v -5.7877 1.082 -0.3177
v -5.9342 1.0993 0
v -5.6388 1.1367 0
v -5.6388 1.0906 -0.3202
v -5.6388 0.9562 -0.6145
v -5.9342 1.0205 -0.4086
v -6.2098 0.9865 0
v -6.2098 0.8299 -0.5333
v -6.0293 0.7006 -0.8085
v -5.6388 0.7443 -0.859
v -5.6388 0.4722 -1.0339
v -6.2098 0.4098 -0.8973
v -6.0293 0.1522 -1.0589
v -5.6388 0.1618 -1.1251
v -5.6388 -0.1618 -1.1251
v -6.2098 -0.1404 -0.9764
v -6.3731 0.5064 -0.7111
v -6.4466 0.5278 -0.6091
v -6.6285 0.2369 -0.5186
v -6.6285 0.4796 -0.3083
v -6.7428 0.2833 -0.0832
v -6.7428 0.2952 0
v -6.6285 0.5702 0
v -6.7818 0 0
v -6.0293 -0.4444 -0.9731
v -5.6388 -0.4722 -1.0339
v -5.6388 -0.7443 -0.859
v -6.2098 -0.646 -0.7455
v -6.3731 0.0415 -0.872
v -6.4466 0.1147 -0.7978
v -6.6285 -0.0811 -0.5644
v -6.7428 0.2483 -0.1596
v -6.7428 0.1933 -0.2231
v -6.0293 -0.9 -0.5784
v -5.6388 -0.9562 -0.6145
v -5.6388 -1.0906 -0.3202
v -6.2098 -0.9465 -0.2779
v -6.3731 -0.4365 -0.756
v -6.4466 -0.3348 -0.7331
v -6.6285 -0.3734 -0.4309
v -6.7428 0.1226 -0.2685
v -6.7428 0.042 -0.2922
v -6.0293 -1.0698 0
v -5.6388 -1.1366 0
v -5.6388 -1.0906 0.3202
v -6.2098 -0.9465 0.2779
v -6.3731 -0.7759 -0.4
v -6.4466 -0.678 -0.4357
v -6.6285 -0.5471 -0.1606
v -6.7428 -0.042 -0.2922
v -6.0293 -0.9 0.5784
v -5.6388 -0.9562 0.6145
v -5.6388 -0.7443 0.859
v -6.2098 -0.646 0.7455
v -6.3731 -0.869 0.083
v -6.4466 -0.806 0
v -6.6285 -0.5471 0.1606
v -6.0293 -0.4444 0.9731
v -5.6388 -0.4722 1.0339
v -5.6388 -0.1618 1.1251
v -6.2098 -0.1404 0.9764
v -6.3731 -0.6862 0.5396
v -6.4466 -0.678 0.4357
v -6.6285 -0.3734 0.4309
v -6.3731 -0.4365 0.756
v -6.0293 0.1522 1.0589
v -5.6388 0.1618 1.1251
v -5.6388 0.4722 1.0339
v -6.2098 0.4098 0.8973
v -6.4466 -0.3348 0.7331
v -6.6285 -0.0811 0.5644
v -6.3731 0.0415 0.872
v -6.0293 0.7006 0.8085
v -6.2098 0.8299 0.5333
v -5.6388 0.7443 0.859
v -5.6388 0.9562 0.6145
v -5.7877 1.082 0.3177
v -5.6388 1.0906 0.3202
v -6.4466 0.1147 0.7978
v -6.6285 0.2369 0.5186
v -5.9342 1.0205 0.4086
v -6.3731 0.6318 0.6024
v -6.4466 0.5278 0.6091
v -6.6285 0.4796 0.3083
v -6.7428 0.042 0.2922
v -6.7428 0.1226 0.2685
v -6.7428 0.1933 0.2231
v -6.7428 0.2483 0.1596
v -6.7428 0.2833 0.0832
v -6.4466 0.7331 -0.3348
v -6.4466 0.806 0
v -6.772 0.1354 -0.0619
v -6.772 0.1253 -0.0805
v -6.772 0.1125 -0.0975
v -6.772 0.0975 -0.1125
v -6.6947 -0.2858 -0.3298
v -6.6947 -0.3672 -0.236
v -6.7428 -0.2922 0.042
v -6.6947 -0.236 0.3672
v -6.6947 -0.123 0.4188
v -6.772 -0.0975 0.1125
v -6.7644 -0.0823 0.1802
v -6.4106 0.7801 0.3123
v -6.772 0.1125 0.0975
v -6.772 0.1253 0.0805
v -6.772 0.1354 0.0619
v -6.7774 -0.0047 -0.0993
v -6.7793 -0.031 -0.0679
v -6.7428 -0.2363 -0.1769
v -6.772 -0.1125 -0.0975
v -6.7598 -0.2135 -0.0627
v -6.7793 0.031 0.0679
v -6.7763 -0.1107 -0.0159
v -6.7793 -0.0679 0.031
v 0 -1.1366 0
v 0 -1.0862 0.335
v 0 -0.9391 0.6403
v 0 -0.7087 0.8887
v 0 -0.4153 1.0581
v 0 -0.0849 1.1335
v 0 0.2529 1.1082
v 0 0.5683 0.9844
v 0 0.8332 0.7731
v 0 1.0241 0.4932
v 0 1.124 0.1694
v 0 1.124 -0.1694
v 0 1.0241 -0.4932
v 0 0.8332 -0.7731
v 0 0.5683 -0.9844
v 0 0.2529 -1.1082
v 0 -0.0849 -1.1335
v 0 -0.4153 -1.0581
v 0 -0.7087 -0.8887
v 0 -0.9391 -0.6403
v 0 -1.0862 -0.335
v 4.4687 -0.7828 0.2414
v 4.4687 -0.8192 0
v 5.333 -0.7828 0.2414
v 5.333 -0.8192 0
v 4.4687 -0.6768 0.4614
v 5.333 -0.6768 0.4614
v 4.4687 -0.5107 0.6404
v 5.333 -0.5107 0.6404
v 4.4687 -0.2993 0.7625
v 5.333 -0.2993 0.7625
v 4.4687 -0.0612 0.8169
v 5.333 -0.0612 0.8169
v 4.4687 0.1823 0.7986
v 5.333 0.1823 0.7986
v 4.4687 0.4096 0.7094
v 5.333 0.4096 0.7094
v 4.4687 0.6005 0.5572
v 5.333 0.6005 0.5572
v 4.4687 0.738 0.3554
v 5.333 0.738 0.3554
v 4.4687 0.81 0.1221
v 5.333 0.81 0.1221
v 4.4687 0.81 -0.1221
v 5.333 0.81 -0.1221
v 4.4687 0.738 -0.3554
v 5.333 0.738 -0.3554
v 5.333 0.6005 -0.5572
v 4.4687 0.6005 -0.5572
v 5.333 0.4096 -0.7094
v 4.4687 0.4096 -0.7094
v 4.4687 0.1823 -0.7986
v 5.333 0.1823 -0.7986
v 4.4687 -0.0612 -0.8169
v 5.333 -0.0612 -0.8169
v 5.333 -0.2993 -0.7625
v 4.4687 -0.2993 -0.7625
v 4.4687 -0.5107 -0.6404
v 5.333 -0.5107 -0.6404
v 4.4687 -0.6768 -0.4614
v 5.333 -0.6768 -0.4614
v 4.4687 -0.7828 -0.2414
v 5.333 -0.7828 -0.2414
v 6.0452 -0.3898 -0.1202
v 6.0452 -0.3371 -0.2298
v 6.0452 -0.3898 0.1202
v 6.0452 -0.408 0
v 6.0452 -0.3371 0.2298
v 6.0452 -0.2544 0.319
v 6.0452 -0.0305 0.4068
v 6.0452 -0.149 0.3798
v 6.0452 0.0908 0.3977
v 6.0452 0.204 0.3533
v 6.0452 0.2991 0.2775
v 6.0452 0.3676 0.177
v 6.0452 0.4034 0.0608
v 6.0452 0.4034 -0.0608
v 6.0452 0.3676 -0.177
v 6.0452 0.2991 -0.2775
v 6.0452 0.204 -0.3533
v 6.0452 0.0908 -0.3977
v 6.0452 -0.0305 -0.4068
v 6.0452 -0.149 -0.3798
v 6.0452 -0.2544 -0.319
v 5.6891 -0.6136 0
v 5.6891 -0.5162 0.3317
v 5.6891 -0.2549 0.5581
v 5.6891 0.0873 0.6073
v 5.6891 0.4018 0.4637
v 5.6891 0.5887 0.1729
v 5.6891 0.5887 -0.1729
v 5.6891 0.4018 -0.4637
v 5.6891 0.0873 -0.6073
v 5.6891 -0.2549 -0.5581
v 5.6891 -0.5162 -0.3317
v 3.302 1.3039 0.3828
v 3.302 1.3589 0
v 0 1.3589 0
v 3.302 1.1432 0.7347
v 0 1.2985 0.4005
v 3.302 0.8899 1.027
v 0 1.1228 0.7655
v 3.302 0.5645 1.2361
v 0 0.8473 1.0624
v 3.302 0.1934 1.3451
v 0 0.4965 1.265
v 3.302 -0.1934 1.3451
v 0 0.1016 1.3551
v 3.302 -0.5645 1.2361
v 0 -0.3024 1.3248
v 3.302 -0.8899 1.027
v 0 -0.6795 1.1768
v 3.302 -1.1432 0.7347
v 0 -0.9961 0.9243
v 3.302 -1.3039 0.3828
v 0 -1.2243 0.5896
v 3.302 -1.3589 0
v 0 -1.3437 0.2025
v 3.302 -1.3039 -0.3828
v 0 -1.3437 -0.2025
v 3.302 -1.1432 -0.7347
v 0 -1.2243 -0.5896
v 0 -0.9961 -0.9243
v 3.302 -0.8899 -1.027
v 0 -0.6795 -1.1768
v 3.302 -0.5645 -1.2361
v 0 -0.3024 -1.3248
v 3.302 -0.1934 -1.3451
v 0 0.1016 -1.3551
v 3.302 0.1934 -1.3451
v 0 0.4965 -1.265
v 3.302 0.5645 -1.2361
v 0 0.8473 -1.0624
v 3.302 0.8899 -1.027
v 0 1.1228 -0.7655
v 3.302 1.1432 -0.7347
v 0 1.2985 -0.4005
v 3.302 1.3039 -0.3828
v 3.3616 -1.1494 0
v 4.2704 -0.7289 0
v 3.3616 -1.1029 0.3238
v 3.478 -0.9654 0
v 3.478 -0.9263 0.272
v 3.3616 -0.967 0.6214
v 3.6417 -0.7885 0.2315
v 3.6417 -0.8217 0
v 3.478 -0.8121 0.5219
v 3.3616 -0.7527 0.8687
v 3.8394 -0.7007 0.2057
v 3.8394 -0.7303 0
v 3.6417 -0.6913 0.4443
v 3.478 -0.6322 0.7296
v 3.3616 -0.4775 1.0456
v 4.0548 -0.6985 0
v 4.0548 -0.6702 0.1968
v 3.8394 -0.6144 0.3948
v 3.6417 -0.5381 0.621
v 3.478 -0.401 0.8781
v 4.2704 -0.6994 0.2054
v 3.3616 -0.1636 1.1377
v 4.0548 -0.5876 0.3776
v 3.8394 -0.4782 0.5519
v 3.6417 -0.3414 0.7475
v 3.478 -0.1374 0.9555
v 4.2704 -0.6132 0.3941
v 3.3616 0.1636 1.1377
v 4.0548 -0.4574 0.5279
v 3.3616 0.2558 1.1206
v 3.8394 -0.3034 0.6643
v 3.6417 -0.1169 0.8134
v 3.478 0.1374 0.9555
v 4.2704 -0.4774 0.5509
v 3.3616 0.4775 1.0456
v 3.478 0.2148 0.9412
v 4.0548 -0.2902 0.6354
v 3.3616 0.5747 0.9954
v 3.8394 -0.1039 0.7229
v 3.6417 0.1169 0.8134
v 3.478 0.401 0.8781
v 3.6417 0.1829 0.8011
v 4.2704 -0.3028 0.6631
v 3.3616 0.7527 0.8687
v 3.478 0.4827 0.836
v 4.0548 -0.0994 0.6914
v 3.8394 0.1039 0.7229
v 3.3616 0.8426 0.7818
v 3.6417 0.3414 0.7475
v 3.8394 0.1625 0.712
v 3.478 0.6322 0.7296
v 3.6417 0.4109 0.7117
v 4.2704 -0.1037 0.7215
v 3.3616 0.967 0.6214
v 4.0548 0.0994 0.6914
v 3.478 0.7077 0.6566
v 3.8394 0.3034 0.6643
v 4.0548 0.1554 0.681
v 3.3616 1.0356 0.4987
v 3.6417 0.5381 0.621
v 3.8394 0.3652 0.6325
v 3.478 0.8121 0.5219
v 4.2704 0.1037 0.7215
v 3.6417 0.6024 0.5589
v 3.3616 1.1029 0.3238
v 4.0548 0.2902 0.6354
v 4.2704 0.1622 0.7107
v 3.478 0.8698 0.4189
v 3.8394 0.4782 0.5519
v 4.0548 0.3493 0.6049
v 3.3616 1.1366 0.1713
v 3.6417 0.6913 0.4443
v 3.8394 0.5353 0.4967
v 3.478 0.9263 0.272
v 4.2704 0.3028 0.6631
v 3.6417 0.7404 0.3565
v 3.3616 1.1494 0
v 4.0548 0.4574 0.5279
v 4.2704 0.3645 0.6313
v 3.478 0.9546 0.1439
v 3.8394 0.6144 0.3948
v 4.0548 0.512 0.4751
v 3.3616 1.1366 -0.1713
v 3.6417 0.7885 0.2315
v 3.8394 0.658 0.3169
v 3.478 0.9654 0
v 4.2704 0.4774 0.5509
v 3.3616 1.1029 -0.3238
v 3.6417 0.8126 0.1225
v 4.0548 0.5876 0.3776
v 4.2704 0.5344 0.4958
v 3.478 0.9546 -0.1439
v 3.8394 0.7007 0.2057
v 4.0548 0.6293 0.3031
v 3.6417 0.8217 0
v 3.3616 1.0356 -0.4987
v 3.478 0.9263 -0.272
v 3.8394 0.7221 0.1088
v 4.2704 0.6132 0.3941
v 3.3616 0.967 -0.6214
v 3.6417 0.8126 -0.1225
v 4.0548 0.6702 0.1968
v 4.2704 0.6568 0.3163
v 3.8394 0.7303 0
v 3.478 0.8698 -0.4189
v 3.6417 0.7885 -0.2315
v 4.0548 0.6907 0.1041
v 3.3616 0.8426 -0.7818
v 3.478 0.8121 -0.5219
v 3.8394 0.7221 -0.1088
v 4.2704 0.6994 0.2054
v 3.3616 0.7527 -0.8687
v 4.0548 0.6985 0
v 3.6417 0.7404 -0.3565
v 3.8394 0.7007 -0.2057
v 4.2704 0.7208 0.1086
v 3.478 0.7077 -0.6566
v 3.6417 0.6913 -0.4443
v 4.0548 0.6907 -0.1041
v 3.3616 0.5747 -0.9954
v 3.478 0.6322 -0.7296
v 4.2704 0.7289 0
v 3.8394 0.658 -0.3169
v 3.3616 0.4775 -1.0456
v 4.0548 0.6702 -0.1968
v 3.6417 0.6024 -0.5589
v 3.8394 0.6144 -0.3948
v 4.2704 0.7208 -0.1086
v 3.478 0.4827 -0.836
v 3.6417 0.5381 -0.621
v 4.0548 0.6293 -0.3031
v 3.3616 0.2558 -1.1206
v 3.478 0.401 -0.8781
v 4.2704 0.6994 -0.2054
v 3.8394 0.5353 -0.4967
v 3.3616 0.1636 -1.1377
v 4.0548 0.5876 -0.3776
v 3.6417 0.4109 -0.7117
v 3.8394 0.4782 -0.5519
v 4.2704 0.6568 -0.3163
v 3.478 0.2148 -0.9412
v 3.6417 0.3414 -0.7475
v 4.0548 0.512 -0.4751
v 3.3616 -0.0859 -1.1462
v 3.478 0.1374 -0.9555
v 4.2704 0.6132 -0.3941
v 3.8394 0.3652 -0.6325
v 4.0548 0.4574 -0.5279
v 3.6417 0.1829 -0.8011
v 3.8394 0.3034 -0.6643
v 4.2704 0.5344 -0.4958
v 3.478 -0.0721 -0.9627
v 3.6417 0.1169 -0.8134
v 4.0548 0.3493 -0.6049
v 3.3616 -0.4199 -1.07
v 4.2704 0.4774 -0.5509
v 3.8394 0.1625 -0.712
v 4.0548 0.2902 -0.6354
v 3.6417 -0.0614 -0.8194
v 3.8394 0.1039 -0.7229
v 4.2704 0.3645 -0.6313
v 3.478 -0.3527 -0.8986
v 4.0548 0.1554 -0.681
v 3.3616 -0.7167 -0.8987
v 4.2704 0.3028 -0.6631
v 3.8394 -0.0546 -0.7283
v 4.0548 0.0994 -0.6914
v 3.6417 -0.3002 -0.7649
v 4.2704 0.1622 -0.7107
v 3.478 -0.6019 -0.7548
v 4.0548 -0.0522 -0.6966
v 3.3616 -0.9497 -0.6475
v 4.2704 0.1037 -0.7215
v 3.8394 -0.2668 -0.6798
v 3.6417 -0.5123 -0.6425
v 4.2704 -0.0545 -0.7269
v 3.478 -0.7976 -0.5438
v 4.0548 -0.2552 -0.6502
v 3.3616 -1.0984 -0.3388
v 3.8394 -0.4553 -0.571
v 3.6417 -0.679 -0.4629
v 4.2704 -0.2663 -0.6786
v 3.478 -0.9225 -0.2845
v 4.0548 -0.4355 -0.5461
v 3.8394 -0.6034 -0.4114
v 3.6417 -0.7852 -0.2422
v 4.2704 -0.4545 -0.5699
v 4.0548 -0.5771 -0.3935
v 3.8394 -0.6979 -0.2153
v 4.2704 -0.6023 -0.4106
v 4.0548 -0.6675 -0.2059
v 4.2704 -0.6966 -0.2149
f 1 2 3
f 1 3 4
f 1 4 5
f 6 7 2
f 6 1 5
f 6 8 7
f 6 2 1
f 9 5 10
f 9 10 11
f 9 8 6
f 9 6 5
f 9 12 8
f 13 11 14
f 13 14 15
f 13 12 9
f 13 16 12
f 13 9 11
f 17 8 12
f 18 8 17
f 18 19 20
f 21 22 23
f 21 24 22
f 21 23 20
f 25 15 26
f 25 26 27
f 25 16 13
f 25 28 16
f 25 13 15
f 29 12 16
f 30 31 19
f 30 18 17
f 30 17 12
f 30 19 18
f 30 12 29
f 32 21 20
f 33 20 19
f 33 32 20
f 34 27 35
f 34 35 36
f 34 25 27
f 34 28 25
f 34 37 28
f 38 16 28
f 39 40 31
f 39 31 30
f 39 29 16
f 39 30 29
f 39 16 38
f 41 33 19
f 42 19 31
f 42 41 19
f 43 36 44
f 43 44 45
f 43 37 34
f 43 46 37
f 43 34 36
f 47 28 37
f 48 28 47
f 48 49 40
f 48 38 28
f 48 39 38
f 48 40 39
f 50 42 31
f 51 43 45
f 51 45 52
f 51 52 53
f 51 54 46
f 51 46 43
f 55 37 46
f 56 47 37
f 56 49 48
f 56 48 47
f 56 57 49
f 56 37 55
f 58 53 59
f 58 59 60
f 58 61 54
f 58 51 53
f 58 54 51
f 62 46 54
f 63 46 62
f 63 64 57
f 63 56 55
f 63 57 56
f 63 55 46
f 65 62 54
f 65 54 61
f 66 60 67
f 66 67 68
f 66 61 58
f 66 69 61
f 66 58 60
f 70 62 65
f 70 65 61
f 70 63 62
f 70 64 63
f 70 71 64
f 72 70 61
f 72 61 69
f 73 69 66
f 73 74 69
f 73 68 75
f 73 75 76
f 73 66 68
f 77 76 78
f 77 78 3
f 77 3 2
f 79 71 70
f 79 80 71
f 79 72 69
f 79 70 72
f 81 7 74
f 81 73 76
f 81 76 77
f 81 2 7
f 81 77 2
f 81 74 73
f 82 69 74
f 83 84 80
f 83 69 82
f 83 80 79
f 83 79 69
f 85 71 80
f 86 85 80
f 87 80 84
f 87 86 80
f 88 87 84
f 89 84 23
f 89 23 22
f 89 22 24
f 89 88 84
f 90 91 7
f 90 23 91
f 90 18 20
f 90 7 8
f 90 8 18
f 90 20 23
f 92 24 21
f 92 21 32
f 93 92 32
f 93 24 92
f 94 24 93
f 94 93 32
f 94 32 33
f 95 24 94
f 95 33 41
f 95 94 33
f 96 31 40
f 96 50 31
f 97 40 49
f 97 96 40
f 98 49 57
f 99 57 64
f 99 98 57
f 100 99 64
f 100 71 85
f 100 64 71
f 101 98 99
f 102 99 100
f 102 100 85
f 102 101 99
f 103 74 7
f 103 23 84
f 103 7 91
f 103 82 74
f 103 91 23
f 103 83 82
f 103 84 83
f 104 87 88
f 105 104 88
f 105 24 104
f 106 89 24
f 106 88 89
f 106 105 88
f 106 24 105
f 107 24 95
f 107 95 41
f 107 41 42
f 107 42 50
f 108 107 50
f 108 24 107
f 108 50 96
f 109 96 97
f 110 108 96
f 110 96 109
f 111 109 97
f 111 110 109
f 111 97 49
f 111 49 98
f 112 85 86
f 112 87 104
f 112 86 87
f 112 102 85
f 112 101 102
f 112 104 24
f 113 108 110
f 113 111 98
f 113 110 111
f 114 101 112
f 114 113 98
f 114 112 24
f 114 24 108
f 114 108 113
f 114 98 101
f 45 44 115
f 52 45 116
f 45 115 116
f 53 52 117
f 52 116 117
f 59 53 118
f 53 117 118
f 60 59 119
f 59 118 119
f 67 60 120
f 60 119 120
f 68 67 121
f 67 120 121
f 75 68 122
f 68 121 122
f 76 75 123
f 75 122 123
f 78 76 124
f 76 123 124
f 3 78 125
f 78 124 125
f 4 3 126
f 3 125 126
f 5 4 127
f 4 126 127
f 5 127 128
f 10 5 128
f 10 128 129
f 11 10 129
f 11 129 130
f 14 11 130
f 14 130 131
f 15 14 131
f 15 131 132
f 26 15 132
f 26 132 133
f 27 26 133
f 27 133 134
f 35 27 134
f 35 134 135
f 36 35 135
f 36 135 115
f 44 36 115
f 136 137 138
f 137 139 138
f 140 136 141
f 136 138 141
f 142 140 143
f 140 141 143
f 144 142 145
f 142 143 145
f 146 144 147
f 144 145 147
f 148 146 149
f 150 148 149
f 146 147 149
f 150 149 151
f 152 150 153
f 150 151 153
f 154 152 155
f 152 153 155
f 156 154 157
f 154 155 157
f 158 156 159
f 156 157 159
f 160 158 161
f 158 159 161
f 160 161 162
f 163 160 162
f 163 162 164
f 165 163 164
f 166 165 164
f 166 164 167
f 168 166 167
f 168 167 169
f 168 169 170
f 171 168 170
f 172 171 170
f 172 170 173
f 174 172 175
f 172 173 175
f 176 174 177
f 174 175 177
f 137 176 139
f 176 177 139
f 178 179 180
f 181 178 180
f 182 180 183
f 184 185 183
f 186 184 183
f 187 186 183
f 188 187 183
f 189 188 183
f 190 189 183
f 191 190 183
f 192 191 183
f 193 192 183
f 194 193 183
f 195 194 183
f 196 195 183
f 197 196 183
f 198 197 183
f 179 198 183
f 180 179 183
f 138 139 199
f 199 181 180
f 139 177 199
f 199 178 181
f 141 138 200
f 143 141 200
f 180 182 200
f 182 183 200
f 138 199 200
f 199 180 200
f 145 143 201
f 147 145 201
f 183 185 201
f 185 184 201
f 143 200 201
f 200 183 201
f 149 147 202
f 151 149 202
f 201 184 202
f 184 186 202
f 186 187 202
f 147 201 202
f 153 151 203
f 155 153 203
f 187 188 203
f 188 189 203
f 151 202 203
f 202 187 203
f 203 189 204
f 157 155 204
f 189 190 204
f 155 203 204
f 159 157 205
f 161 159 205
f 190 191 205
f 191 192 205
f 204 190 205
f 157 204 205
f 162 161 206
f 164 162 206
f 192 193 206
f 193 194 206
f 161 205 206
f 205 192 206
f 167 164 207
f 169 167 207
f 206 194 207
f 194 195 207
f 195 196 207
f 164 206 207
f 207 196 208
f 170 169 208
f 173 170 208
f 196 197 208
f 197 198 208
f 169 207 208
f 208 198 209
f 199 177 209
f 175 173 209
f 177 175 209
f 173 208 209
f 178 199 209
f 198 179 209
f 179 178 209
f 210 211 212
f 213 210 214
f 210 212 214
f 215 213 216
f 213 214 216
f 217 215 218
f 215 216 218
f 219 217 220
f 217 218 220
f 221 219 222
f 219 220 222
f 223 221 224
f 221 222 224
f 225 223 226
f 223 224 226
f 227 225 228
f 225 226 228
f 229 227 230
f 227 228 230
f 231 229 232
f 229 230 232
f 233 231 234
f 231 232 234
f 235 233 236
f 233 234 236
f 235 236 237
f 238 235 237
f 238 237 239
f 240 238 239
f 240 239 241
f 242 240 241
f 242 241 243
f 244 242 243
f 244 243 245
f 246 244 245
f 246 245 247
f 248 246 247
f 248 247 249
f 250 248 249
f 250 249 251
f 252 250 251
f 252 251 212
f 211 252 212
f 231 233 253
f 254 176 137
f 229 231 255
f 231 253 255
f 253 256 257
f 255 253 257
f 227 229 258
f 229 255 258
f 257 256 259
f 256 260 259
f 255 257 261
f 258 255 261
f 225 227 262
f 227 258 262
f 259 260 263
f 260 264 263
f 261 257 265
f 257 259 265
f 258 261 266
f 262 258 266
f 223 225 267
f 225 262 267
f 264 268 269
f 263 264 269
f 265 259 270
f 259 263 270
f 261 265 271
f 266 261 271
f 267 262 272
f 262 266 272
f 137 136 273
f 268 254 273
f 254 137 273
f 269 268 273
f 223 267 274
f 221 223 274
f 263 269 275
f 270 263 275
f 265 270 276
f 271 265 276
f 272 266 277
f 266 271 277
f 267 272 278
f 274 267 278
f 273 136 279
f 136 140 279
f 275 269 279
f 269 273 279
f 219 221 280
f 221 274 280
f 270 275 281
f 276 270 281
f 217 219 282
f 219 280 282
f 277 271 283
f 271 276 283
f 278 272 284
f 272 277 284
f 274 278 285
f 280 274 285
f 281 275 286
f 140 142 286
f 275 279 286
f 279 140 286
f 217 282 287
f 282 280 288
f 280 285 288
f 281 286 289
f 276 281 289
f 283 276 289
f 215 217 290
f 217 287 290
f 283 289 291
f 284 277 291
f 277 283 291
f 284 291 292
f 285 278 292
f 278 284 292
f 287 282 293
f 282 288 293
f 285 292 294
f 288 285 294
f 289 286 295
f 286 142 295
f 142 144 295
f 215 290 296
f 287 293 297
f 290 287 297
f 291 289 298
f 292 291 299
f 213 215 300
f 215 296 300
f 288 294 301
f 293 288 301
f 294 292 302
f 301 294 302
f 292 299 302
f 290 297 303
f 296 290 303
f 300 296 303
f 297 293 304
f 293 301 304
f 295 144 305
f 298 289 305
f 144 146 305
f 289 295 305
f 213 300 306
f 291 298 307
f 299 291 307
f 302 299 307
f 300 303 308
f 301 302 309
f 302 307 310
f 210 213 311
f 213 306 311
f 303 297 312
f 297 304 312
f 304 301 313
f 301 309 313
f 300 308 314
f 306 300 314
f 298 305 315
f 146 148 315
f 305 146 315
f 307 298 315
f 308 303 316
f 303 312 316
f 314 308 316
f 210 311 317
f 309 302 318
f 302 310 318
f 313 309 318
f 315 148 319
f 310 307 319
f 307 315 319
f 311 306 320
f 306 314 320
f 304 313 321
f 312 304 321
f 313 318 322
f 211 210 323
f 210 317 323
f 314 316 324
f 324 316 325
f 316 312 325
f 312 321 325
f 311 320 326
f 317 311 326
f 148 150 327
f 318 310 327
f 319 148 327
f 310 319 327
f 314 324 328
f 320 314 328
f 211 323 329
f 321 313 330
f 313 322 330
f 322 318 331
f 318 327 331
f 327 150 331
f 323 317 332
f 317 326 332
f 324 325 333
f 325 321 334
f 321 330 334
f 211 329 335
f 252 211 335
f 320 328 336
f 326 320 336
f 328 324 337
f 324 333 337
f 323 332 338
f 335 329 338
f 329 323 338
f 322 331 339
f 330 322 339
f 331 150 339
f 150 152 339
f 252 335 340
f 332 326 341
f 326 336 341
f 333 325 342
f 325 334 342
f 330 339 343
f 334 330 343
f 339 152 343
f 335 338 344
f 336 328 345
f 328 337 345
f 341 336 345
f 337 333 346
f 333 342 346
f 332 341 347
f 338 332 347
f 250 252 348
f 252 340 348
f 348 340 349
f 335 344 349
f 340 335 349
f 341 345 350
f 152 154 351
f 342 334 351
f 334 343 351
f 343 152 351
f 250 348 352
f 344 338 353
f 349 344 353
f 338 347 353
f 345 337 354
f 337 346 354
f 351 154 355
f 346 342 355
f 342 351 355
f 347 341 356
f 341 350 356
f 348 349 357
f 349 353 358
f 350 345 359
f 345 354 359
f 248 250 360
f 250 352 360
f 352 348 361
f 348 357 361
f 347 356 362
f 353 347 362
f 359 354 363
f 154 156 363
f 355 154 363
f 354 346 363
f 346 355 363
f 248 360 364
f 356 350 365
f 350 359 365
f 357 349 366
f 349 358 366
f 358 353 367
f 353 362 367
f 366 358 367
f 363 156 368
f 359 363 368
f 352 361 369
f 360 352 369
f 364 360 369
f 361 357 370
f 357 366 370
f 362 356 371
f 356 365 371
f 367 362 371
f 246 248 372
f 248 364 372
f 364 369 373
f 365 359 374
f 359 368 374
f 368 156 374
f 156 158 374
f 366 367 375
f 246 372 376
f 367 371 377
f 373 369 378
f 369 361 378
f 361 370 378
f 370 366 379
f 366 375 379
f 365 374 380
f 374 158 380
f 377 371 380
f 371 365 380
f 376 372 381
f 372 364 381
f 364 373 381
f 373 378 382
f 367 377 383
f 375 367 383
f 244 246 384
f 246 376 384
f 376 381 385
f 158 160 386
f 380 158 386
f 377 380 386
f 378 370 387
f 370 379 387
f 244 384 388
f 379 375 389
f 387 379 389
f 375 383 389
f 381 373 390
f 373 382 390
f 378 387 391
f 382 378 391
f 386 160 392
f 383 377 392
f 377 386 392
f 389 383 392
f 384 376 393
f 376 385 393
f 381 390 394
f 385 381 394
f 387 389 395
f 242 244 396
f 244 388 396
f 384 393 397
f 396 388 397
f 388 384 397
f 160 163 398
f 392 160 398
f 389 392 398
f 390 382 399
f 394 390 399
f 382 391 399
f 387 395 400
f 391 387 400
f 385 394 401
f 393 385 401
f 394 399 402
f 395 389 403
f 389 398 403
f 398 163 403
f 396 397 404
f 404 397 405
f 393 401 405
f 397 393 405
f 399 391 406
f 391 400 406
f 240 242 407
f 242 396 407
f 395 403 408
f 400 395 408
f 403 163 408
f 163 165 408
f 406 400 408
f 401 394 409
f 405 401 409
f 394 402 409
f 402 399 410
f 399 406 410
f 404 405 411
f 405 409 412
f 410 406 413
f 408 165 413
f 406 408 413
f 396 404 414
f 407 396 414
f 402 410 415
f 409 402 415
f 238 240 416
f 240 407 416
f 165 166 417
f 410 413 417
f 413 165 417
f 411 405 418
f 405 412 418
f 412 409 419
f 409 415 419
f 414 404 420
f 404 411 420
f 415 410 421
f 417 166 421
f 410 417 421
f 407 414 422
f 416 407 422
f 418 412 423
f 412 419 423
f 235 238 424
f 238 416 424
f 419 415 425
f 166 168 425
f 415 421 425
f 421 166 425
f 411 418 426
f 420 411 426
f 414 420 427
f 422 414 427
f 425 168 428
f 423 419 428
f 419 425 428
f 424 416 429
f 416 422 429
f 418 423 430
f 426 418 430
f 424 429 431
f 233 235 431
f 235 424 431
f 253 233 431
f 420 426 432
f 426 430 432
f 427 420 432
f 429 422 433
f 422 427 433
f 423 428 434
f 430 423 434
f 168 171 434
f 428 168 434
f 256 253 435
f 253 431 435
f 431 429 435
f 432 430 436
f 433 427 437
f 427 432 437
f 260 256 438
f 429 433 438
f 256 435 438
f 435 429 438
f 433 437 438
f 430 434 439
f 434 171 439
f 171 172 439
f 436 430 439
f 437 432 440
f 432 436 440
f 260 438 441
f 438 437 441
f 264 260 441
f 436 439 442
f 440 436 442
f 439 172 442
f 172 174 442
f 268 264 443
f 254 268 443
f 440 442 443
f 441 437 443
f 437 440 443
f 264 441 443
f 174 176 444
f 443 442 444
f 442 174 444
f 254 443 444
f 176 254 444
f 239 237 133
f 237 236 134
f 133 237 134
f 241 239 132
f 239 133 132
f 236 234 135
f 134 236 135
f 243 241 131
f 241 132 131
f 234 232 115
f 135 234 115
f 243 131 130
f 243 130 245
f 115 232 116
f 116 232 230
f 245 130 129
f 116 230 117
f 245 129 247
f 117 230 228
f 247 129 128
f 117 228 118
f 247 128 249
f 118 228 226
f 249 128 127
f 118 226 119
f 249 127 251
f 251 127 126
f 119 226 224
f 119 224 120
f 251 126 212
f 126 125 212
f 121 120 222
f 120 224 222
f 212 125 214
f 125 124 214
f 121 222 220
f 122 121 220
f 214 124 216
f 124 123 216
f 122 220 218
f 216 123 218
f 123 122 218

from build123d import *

# Parameters (mm, degrees)
F0_R     = 1.3589
F1_DEPTH = 3.302
F2_R     = 1.13665
F3_DEPTH = 5.6388


with BuildPart() as f1:
    # F0 (on Right) → F1 (new body)
    with BuildSketch(Plane.YZ):
        Circle(F0_R)
    extrude(amount=F1_DEPTH)

    # F2 (on face) → F3 (join)
    with BuildSketch(Plane(origin=(0, 0, 0), x_dir=(0, -1, 0), z_dir=(-1, 0, 0))):
        Circle(F2_R)
    extrude(amount=F3_DEPTH)

    # F4 (on Top) → F5 (revolve)
    with BuildSketch(Plane.XY):
        with BuildLine():
            Line((-6.7818, 0), (-5.6388, 0))
            Line((-5.6388, 0), (-5.6388, 1.13665))
            ThreePointArc((-5.6388, 1.13665), (-6.446636, 0.805981), (-6.7818, 0))
        make_face()
    revolve(axis=Axis((-6.2103, 0, 0), (-1, 0, 0)))

    # F6 (on Top) → F7 (revolve)
    with BuildSketch(Plane.XY):
        with BuildLine():
            Line((6.0452, 0), (3.302, 0))
            Line((3.302, 0), (3.302, -1.3589))
            ThreePointArc((3.302, -1.3589), (3.737246, -0.768925), (4.468674, -0.81915))
            Line((4.468674, -0.81915), (5.333006, -0.81915))
            Line((5.333006, -0.81915), (6.0452, -0.407965))
            Line((6.0452, -0.407965), (6.0452, 0))
        make_face()
    revolve(axis=Axis((4.6736, 0, 0), (-1, 0, 0)))


solid = f1.part
